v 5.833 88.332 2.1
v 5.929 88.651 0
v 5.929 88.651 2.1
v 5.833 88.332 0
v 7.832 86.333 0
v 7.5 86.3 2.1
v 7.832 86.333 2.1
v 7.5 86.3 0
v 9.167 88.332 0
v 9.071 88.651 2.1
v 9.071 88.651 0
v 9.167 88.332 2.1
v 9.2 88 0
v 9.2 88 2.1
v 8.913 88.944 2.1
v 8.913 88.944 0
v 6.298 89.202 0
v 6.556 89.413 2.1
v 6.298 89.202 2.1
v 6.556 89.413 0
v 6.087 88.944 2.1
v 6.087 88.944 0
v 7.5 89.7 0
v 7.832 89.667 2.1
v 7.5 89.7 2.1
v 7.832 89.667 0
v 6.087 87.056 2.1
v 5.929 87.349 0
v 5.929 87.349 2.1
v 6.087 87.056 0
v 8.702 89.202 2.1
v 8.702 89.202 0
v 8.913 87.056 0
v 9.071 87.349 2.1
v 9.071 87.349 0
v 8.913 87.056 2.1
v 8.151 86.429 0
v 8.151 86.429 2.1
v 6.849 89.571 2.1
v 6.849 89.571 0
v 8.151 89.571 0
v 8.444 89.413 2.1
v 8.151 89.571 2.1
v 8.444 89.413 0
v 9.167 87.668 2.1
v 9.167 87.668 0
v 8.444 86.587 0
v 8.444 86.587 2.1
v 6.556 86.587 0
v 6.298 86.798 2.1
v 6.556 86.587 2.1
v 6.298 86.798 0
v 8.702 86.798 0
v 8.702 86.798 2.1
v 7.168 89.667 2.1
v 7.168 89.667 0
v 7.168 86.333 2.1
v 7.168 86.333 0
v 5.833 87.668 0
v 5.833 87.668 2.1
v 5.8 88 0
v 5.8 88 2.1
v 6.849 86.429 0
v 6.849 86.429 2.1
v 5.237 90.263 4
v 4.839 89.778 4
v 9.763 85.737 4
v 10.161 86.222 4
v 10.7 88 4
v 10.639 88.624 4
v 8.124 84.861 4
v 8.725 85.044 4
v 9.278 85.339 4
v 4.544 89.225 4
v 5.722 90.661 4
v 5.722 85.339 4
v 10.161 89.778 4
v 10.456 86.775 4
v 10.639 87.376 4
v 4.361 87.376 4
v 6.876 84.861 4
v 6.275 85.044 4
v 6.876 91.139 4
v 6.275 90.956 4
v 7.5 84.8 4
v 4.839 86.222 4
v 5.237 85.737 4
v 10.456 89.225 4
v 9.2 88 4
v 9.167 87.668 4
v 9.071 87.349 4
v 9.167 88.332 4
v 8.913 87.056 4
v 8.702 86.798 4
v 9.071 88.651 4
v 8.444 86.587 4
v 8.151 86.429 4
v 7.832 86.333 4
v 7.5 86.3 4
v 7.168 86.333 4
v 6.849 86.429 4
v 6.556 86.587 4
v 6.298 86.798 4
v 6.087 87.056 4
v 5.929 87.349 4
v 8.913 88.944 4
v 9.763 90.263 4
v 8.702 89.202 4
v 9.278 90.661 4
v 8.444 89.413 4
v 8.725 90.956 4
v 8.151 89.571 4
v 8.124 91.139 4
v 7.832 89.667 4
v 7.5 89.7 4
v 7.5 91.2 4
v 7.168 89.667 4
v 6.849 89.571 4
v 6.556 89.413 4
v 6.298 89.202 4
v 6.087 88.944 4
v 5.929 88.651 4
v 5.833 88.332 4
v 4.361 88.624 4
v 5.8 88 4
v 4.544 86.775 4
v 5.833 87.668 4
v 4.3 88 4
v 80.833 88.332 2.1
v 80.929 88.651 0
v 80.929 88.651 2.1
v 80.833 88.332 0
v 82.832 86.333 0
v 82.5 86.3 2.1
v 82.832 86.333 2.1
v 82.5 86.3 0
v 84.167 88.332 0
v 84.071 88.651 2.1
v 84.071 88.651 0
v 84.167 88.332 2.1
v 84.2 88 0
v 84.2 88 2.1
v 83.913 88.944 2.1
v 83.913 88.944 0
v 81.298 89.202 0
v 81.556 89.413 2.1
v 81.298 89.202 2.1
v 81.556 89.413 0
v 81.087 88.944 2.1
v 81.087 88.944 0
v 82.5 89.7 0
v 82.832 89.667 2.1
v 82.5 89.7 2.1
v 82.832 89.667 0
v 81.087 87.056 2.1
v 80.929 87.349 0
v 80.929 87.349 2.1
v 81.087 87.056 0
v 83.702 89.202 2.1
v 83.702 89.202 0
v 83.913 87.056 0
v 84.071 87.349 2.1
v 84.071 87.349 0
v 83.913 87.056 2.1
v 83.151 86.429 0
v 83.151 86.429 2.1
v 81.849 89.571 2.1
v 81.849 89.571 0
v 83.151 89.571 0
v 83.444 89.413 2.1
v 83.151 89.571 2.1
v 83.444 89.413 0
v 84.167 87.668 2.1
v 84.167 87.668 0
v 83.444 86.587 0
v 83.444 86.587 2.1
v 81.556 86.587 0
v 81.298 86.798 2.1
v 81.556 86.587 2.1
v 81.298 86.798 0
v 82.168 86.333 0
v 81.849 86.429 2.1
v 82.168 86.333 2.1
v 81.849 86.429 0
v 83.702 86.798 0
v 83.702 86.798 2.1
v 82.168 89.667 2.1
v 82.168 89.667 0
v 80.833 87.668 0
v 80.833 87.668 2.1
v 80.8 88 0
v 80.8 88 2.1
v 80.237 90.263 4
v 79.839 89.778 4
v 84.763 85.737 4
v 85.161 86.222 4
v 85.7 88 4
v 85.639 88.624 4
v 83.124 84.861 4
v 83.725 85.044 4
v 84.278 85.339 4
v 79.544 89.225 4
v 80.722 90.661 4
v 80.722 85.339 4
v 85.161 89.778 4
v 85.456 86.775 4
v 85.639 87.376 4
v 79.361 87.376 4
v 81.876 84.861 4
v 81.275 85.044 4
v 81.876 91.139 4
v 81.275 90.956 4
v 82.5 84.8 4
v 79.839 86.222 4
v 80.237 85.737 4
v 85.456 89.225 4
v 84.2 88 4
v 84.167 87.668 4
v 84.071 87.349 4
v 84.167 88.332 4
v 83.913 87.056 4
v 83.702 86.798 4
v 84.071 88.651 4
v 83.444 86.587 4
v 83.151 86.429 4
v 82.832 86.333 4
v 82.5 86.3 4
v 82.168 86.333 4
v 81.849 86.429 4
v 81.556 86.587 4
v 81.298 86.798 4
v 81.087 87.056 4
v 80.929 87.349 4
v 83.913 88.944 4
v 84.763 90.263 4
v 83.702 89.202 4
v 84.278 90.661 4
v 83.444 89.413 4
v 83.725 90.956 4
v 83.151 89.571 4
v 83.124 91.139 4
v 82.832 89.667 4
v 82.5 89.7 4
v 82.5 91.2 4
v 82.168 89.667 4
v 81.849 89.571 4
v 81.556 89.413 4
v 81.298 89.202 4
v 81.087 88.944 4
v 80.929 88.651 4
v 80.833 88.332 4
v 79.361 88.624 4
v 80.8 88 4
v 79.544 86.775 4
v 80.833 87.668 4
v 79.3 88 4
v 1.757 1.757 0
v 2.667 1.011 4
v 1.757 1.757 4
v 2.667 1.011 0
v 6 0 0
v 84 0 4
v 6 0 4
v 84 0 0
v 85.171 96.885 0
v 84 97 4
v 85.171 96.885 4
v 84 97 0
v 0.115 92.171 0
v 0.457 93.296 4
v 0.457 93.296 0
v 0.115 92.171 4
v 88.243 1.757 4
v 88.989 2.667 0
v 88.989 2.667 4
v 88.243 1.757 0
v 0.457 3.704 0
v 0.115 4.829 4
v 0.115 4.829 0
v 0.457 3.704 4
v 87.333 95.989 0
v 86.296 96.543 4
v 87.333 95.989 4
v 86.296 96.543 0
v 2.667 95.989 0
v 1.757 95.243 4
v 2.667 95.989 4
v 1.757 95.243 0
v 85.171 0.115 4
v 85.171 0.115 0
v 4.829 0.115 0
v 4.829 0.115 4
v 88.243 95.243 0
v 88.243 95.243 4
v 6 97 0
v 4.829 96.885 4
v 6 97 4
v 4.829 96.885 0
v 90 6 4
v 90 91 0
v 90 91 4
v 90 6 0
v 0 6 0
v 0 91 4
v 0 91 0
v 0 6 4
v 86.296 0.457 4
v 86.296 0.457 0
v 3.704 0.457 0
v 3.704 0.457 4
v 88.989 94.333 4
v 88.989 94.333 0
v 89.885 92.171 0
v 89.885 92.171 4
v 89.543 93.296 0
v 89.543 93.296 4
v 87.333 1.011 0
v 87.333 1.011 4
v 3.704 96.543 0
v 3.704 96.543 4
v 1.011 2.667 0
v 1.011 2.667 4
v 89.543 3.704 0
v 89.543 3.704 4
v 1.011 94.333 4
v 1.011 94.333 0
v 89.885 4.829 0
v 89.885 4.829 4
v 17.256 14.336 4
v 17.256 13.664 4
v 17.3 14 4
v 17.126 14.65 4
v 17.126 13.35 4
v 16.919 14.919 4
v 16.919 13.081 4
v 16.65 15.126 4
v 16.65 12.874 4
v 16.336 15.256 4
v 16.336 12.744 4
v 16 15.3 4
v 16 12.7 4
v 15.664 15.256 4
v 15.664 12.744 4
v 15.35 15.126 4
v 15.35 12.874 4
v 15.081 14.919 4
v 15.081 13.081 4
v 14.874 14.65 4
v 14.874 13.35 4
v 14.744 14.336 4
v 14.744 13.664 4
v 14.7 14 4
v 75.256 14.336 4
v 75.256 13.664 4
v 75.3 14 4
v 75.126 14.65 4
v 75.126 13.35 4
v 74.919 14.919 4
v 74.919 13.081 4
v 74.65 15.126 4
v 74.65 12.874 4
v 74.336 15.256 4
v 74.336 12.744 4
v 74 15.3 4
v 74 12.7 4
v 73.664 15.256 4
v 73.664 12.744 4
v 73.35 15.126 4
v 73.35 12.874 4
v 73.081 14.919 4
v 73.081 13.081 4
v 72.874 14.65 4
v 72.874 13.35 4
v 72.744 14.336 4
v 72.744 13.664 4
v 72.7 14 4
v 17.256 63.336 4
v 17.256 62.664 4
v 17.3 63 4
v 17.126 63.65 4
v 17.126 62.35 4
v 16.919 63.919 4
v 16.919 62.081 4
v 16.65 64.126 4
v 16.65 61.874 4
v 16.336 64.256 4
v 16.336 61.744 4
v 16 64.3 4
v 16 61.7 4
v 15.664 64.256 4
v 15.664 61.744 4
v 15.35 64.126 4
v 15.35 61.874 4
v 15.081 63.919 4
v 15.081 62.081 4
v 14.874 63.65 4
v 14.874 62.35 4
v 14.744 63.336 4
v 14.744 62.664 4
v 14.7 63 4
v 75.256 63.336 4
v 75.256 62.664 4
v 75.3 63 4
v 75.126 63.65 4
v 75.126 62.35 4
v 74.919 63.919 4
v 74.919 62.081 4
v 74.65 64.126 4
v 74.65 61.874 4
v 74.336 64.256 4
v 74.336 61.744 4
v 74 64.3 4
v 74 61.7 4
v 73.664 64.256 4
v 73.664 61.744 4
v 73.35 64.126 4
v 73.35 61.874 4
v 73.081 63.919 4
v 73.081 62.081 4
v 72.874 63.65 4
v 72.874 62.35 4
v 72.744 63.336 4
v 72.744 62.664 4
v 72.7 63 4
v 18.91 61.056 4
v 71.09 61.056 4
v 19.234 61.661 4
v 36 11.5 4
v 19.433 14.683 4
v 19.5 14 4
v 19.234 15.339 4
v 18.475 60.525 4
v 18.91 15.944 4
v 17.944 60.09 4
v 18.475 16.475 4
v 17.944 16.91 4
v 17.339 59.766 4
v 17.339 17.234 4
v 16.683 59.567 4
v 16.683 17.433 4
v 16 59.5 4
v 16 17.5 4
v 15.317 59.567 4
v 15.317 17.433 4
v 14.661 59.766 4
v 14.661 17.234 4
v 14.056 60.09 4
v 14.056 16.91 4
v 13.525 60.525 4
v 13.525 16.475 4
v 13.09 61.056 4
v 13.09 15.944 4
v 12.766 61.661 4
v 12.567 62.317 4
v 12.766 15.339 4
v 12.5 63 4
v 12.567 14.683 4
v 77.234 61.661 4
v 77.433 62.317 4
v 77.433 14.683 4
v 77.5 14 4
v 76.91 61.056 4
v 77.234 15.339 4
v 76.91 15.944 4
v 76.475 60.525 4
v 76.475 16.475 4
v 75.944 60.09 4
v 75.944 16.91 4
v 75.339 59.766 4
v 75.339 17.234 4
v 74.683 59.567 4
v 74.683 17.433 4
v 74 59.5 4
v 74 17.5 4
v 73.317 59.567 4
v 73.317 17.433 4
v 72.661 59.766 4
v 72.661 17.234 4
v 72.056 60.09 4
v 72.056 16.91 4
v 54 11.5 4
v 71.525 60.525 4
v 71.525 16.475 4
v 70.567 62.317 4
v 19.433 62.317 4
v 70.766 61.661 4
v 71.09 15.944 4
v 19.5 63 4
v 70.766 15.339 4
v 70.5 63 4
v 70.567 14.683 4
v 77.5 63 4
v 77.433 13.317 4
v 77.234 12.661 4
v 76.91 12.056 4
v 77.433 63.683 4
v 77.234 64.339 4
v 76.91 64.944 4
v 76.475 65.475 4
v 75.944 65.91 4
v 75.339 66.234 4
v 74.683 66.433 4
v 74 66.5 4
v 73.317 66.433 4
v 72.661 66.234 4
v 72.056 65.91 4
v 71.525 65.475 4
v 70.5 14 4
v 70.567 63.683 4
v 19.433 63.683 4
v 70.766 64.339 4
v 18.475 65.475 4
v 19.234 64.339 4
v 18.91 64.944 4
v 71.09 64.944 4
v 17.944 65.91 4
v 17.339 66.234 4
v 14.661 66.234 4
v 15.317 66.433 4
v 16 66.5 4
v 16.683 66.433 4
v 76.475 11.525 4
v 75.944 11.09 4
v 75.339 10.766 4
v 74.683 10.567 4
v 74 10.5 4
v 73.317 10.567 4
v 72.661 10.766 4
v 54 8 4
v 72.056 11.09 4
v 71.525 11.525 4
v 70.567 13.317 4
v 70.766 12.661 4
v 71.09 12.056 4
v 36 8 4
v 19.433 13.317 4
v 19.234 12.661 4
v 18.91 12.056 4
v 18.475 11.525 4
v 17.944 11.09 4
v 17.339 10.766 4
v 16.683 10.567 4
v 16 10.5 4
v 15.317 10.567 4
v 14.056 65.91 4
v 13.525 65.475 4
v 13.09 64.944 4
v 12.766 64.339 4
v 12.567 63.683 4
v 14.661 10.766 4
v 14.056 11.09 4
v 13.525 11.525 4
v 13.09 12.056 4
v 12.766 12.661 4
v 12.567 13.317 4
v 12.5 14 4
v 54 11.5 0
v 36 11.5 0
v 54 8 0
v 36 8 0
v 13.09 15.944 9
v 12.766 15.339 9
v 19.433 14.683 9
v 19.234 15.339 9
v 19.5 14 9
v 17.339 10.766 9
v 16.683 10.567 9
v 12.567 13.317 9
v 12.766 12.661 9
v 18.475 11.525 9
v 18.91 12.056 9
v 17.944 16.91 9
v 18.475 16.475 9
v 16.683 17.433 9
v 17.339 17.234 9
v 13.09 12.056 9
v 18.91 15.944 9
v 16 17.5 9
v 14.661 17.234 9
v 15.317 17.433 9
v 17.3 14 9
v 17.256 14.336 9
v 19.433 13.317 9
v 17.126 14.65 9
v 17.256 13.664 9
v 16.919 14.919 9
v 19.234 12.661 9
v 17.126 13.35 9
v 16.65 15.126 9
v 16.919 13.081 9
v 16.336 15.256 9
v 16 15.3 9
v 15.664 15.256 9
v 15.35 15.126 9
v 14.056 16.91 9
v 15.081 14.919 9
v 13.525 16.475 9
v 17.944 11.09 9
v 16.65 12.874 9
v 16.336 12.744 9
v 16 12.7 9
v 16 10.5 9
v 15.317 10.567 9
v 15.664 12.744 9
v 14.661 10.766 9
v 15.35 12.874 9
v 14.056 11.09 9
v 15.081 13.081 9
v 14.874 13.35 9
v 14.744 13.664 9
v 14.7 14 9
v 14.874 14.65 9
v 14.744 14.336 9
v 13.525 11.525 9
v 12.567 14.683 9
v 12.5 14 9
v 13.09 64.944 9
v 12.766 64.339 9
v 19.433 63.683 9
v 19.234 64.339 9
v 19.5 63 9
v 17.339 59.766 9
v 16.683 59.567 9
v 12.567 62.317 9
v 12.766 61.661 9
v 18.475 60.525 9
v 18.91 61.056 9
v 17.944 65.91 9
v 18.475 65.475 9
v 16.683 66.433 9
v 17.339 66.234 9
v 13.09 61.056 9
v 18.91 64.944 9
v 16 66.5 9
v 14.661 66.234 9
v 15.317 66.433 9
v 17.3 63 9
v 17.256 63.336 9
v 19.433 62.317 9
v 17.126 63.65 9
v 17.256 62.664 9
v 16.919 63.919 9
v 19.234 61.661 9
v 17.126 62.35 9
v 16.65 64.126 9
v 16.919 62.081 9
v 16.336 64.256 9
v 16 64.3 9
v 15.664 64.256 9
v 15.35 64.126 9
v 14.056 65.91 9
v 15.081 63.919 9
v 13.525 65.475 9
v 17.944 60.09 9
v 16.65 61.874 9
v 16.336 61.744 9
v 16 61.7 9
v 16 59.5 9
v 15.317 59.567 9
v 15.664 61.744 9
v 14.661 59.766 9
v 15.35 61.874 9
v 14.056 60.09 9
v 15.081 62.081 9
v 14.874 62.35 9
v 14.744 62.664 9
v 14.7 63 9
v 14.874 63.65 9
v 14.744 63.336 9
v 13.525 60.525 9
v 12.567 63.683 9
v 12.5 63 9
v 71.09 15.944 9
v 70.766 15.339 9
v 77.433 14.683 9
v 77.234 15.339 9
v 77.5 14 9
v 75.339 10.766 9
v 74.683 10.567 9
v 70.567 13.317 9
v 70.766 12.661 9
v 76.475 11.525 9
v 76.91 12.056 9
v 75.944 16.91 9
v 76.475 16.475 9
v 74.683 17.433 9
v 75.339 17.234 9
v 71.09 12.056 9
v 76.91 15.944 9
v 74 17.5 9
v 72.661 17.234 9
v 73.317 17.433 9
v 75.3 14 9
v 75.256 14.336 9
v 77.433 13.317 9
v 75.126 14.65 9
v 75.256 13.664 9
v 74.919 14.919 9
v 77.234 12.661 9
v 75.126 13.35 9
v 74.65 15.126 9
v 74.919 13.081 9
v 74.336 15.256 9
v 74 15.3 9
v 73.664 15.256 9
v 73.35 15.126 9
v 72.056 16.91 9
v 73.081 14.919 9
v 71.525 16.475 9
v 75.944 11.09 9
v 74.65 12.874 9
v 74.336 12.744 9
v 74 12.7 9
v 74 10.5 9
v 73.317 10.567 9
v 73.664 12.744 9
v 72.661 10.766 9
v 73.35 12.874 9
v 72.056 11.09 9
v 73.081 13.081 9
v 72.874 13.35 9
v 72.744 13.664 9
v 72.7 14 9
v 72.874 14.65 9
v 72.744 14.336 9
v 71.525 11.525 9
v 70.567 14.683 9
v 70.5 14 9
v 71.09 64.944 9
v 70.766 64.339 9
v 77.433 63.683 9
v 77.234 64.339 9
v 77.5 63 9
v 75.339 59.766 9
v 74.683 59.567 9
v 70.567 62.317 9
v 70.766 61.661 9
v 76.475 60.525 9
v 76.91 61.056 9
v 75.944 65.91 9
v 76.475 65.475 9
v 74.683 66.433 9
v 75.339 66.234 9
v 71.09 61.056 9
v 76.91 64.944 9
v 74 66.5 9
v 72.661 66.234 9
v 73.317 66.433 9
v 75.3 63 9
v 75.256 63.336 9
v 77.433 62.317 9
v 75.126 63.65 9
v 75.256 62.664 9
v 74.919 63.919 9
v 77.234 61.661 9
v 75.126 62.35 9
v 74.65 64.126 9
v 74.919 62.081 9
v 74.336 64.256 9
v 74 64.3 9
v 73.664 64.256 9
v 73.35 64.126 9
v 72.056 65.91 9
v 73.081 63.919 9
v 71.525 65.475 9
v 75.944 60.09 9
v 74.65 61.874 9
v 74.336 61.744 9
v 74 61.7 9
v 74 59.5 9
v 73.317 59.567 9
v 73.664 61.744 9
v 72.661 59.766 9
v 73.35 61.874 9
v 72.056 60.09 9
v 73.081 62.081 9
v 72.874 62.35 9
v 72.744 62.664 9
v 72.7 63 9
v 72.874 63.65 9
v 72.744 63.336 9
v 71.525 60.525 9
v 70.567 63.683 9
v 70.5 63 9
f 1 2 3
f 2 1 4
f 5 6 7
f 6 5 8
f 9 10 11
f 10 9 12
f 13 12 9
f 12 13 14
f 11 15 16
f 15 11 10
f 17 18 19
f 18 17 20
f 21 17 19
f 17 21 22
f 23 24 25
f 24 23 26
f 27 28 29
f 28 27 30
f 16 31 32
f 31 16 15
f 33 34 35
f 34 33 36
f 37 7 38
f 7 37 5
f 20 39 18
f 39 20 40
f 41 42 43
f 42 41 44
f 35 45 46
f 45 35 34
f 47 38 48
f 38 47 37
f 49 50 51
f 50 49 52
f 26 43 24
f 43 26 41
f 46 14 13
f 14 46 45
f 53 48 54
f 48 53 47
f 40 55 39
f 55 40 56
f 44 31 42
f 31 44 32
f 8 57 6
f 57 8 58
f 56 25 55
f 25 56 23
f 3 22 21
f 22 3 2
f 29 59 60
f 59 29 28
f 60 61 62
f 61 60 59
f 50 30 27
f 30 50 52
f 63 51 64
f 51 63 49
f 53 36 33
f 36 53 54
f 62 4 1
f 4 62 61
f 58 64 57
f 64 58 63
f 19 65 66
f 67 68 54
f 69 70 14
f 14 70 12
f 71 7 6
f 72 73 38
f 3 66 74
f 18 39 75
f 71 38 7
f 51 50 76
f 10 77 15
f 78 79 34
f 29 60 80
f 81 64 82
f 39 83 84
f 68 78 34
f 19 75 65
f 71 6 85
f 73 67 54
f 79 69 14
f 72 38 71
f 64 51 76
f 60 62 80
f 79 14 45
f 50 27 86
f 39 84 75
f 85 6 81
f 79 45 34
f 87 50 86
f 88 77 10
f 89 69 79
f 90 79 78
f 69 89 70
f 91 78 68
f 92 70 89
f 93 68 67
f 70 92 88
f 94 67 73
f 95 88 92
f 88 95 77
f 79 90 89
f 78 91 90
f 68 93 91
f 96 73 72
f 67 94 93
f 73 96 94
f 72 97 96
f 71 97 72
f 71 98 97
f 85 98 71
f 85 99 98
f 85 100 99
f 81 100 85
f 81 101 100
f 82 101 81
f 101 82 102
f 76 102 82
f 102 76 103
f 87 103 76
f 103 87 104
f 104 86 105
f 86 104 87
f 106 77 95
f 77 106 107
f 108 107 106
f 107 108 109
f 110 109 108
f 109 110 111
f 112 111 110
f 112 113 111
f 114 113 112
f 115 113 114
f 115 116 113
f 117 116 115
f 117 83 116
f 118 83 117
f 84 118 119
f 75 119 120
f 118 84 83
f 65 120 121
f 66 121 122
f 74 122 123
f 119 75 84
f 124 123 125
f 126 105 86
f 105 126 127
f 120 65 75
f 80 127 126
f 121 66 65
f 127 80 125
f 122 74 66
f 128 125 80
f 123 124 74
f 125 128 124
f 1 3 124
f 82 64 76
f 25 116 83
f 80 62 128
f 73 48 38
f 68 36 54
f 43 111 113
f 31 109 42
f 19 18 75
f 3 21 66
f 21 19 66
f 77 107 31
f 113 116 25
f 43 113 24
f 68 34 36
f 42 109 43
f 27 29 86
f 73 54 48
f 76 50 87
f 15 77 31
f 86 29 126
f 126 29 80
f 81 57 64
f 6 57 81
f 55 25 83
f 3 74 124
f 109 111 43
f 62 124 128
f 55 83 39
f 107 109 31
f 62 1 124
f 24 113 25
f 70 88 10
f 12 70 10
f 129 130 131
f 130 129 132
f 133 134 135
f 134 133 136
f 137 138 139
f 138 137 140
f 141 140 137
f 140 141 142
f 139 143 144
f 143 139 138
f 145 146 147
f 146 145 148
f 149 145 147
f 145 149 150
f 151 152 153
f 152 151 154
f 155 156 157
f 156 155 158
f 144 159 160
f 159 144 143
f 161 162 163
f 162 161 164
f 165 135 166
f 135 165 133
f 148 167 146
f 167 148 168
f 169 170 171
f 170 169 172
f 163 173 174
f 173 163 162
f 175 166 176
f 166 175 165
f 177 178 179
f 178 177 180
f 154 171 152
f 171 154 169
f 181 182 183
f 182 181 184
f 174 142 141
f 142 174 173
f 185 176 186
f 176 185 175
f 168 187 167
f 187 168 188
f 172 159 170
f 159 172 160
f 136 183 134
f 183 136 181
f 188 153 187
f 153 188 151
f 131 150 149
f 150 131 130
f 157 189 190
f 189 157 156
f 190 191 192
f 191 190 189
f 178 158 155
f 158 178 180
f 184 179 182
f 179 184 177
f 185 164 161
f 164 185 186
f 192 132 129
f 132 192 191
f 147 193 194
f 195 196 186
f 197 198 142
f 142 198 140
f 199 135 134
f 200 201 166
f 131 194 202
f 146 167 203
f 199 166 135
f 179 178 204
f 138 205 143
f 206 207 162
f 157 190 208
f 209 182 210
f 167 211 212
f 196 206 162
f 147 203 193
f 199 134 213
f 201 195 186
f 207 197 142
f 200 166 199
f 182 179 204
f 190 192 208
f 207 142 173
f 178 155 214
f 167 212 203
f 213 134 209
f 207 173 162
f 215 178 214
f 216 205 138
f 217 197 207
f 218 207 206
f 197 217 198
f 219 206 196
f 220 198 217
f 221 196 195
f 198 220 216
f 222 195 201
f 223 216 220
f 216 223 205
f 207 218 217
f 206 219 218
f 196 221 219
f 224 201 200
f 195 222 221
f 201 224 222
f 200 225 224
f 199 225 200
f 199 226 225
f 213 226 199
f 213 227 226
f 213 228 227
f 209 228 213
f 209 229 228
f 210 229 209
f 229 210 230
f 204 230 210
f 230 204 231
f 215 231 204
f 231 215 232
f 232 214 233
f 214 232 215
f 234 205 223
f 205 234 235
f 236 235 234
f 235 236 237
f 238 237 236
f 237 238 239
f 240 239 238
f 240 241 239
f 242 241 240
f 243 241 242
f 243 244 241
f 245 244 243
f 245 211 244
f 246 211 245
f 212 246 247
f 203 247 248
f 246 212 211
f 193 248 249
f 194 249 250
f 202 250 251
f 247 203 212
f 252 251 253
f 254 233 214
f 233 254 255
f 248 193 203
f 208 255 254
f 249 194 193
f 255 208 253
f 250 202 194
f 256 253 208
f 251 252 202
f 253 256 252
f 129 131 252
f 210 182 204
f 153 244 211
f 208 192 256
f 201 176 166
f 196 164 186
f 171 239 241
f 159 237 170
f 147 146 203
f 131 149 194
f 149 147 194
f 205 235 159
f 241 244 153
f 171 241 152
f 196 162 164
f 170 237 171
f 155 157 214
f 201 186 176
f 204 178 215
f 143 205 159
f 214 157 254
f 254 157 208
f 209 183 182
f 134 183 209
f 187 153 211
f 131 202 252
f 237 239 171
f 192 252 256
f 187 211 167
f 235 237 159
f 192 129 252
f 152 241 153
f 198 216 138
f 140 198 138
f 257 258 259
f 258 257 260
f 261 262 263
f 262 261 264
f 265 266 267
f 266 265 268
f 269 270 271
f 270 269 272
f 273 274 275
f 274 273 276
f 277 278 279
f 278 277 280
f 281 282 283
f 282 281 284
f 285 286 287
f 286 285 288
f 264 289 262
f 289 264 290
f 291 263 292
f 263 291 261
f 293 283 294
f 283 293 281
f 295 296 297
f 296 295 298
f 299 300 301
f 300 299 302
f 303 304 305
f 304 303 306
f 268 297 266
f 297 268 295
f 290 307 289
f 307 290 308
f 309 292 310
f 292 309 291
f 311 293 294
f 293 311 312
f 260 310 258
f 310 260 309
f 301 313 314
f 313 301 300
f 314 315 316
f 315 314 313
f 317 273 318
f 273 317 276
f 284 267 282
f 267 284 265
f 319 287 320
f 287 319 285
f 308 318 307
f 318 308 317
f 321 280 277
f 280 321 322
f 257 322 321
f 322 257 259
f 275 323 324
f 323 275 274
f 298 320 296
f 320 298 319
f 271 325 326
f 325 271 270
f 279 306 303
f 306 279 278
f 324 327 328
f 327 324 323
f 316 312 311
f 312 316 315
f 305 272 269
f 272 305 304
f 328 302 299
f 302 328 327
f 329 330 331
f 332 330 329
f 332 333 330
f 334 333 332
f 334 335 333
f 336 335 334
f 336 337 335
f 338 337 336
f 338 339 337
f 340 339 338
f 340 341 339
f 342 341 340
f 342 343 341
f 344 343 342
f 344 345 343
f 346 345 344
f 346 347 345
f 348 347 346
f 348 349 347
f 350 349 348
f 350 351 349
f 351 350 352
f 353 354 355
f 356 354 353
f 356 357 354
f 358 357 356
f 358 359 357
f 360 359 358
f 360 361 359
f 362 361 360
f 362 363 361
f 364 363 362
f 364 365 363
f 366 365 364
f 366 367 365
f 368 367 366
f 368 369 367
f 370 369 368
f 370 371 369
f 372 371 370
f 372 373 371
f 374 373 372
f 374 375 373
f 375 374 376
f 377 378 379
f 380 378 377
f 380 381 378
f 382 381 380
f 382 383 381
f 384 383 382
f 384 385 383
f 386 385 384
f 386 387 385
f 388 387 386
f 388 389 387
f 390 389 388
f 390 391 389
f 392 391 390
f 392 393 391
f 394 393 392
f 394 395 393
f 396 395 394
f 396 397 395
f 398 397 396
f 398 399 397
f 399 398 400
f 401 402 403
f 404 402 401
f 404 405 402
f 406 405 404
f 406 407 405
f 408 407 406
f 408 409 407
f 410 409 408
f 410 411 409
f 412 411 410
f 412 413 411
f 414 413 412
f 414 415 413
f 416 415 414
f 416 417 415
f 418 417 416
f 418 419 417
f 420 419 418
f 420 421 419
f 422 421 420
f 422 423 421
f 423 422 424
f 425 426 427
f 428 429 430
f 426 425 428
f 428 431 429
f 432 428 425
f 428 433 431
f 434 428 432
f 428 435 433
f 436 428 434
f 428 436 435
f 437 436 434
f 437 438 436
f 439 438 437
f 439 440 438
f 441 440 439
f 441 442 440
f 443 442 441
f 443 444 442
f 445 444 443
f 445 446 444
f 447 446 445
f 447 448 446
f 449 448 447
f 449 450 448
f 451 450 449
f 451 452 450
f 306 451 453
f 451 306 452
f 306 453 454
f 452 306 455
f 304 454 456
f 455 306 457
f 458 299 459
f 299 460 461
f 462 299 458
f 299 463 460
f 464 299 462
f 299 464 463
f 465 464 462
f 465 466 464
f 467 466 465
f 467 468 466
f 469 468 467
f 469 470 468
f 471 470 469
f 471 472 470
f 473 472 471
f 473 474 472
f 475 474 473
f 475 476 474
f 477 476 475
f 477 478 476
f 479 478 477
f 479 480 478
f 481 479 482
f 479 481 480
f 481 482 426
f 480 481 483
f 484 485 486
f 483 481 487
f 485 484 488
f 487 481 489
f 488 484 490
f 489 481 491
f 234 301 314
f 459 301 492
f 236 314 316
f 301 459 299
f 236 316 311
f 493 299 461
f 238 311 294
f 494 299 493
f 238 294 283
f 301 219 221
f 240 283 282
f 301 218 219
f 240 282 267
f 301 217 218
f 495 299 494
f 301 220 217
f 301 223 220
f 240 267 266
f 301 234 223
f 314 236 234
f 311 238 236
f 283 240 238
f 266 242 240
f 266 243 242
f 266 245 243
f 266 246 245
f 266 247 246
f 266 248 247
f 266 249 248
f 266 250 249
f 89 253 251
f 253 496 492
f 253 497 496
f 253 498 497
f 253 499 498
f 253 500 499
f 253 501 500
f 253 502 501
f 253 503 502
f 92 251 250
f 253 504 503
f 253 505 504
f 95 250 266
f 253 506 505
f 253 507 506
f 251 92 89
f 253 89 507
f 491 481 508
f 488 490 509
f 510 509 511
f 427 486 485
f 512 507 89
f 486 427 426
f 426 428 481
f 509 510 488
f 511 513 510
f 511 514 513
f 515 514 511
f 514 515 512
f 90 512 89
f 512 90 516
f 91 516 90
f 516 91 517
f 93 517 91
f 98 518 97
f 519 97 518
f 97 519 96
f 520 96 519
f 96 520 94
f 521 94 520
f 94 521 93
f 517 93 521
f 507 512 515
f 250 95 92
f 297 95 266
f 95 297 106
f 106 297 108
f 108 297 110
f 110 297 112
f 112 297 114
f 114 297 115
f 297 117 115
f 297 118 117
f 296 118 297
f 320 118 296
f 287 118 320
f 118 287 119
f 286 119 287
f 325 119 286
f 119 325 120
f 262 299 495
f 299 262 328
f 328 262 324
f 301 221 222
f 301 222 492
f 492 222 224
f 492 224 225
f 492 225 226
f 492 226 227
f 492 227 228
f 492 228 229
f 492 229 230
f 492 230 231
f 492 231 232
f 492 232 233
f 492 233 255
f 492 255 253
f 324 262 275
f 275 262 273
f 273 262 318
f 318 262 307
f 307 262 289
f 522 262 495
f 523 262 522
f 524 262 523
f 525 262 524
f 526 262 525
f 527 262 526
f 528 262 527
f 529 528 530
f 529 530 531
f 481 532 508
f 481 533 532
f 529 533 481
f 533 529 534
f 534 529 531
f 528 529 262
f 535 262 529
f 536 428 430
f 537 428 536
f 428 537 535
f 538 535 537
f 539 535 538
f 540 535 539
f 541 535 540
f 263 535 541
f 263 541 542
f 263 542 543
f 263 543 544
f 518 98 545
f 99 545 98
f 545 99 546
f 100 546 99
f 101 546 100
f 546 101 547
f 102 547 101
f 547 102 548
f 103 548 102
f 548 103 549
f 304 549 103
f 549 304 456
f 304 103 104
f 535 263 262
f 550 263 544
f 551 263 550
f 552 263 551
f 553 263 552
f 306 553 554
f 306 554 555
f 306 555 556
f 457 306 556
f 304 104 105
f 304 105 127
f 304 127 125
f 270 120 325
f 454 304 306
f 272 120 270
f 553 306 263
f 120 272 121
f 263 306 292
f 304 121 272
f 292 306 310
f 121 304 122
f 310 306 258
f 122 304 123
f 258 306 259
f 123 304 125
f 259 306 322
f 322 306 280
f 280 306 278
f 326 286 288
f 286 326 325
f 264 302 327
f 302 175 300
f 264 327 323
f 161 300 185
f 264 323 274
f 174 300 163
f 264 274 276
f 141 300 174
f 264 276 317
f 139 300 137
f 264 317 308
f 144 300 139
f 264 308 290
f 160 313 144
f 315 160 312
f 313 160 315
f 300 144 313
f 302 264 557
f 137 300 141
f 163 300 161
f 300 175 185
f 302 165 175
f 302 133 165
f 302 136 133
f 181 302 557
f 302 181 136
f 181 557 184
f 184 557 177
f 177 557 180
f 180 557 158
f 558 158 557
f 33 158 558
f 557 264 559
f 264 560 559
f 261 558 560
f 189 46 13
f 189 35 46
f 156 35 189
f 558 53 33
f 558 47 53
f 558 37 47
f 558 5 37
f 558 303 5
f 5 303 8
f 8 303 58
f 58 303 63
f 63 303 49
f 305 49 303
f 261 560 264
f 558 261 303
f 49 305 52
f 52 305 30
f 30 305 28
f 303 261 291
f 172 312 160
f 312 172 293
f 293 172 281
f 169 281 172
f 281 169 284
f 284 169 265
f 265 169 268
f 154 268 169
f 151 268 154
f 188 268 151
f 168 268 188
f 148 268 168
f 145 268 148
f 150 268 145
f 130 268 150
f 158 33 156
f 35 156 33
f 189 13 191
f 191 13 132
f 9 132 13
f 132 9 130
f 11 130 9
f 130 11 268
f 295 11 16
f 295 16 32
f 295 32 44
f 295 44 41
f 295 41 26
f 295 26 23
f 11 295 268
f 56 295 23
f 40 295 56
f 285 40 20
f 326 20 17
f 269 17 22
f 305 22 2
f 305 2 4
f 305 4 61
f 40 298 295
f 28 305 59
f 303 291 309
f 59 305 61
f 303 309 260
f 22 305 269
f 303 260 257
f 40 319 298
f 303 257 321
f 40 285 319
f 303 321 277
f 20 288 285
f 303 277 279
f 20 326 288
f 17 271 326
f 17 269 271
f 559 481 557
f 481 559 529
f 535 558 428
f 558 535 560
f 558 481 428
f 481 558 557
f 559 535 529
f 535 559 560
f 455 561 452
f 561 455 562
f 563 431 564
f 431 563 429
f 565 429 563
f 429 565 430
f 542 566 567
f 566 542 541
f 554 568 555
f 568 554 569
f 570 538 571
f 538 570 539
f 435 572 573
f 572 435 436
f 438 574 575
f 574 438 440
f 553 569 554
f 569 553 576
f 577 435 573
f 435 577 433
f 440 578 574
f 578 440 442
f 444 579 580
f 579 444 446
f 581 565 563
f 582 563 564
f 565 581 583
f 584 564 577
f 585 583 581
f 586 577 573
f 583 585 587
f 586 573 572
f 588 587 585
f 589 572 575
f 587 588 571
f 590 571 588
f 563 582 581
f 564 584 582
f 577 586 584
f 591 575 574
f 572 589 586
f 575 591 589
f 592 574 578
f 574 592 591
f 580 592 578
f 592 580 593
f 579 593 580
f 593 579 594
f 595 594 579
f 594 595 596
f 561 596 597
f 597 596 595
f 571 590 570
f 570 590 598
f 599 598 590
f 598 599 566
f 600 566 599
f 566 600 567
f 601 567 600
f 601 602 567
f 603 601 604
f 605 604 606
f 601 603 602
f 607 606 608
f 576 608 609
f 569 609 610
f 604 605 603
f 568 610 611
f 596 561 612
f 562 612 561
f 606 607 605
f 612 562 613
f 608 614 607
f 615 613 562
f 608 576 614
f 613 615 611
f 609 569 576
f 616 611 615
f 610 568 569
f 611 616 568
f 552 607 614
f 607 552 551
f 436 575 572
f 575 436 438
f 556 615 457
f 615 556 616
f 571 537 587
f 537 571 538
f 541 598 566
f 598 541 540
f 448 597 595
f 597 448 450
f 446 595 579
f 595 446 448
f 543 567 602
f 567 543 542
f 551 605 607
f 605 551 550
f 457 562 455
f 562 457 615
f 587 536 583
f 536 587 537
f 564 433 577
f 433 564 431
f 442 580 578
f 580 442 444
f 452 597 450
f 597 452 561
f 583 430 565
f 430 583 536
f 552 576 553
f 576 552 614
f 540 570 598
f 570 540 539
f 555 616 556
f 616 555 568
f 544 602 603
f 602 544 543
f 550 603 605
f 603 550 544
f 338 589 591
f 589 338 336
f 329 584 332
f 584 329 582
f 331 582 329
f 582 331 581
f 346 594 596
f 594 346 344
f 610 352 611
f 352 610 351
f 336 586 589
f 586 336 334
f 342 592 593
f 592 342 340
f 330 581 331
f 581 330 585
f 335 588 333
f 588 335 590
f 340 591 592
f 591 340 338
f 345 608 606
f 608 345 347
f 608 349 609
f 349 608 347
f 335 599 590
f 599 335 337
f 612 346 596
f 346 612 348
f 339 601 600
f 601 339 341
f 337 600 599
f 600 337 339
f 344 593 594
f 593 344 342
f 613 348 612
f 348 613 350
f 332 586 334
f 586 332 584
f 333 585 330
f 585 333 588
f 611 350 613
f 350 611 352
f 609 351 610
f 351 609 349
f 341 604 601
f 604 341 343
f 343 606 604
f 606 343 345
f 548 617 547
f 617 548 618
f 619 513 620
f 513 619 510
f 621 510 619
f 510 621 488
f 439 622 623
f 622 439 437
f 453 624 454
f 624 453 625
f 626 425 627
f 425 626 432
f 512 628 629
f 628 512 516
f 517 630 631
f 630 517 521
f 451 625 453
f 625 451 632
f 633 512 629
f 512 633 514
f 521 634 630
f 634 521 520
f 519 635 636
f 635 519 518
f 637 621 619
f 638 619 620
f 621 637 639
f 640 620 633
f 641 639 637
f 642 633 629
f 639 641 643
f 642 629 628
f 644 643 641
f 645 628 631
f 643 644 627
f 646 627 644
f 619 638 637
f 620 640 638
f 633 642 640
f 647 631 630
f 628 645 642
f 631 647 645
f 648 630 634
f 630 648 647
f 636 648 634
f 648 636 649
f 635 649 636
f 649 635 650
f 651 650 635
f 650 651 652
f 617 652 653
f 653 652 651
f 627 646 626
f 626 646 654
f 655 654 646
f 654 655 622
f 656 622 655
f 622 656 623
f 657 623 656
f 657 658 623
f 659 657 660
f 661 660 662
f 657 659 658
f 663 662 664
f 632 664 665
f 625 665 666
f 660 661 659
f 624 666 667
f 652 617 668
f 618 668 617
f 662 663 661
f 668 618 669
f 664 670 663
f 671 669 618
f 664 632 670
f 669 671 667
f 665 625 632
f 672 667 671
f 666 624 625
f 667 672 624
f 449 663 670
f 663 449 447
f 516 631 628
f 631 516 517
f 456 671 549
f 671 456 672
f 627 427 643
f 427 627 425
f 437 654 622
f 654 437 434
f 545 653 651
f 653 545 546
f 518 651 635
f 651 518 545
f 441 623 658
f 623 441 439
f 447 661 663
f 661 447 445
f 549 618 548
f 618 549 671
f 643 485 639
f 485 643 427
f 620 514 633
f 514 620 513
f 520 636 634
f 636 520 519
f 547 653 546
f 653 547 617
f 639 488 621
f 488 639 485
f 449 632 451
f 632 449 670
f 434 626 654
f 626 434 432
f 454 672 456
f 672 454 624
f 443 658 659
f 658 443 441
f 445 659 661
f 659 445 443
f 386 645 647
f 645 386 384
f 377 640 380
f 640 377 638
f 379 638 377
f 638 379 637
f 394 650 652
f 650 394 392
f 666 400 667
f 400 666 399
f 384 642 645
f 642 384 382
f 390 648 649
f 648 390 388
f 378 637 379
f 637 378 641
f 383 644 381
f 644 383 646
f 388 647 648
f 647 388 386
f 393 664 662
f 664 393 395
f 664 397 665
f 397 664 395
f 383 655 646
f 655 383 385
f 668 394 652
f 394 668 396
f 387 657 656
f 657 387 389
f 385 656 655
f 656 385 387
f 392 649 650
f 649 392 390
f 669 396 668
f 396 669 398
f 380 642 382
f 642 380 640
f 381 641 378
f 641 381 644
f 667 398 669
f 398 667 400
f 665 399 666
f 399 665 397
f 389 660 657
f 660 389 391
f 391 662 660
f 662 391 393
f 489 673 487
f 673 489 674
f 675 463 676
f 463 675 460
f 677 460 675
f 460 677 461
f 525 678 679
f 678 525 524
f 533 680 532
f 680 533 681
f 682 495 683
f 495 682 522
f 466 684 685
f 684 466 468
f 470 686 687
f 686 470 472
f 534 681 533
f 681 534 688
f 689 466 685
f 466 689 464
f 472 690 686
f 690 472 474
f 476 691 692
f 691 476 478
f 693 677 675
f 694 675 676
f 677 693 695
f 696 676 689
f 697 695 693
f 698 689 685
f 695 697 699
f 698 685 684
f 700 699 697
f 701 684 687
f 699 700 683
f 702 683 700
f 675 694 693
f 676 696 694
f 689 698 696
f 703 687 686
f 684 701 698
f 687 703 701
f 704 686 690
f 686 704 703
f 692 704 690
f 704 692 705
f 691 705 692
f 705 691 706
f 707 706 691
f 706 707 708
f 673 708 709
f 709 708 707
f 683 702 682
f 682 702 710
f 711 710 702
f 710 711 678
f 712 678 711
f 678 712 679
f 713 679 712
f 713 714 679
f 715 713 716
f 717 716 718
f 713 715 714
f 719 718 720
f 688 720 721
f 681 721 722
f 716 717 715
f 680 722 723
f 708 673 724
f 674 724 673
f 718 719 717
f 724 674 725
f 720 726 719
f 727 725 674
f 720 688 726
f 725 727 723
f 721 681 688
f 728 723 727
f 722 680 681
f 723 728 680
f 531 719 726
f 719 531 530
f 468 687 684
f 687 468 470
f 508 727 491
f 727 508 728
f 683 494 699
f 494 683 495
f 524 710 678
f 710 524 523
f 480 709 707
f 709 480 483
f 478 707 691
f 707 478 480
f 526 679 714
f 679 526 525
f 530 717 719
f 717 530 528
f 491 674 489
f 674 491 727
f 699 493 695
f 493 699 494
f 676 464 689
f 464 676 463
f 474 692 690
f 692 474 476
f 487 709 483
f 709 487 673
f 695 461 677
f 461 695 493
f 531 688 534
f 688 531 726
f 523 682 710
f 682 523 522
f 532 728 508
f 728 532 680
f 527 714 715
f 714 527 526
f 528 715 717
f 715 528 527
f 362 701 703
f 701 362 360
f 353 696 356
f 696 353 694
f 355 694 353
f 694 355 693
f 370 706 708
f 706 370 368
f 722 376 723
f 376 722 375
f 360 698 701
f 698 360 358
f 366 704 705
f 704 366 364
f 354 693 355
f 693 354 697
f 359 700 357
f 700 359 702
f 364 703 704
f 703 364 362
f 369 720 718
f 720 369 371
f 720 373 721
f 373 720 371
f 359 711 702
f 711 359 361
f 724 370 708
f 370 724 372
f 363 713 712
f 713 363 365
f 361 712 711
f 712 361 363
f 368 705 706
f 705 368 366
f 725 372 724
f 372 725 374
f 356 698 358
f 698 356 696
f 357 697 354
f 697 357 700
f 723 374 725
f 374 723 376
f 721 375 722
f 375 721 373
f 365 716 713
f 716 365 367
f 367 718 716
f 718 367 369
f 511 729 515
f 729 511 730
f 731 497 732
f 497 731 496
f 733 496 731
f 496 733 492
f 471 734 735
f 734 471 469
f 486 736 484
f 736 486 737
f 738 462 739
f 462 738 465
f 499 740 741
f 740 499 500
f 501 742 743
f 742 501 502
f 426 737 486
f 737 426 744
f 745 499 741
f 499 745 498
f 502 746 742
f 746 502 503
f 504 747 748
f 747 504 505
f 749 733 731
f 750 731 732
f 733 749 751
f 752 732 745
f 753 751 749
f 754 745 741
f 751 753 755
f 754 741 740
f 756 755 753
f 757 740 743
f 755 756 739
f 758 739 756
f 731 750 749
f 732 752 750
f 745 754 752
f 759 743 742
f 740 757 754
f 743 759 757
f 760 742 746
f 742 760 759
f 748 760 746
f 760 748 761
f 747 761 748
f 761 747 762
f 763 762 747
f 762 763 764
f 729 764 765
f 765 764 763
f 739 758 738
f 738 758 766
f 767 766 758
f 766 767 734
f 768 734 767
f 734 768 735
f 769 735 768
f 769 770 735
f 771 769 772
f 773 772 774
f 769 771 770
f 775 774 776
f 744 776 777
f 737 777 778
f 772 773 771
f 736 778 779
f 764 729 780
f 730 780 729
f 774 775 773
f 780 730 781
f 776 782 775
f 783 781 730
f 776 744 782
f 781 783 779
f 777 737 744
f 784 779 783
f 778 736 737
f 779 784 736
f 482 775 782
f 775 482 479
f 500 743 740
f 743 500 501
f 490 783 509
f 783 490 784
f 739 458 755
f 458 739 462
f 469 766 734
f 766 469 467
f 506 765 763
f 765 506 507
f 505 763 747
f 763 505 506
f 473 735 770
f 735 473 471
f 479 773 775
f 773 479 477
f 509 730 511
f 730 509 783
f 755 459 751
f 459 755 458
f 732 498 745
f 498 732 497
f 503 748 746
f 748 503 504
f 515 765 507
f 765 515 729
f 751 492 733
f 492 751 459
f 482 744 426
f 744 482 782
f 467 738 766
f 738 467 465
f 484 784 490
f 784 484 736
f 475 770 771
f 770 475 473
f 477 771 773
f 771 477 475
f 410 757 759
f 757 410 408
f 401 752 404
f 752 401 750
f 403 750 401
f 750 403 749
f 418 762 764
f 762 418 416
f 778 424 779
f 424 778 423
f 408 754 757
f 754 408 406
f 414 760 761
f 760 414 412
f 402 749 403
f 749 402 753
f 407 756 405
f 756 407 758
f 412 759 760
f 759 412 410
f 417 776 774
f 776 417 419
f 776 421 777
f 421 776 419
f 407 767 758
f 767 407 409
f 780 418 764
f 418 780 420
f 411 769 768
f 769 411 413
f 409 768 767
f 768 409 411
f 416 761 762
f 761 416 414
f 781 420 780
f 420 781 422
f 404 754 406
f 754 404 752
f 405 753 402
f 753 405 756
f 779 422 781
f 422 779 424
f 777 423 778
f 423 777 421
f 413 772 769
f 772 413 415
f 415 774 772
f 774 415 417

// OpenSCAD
// Halter fuer den Raspberry Pi 4 an der Rueckseite des Bildschirms.
//
// Ersetzt die ausgelaserte Holzplatte: Er wird mit zwei M3-Schrauben in die
// beiden Gewinde des Bildschirms geschraubt (Abstand 75 mm, Gewinde nur 5 mm
// tief - also kurze Schrauben nehmen, M3 x 8 reicht). Der Pi sitzt auf vier
// angeformten Abstandshaltern, damit die Loetstellen unter der Platine frei
// bleiben.
//
// Offen und deshalb oben einstellbar: wie weit der Pi unter den Gewinden
// sitzen soll (PI_ABSTAND) und wie dick die Platte wird. Alles in Millimetern.
//
// Rendern und als STL sichern:  openscad -o pi-holder.stl pi-holder.scad

// ---- Was du anpassen kannst -------------------------------------------------
PLATTE_B      = 90;    // Breite der Platte, wie bei deiner Holzversion
PLATTE_D      = 4;     // Dicke der Platte
SCHIRM_LOCH   = 75;    // Abstand der beiden Gewinde im Bildschirm
SCHIRM_RAND   = 9;     // von der Oberkante der Platte bis zur Lochmitte
                       // gemessen hast du 5 - mit Senkung (Ø 6,4) blieben
                       // dann 1,8 mm Rand stehen. 9 gibt der Schraube Halt;
                       // die Platte ragt dafuer 4 mm weiter nach oben.
PI_ABSTAND    = 25;    // von der Lochmitte bis zur ersten Pi-Bohrung
STAND_H       = 5;     // Hoehe der Abstandshalter unter dem Pi
SCHRAUBE_M3   = 3.4;   // Durchgangsloch fuer M3
SCHRAUBE_M25  = 2.6;   // Kernloch fuer M2,5 - selbstschneidend in den Kunststoff
KABEL_SCHLITZ = true;  // Schlitz fuer das Kameraflachband

// ---- Feste Masse des Pi 4 ---------------------------------------------------
PI_X = 58;             // Lochabstand quer
PI_Y = 49;             // Lochabstand laengs
PI_RAND = 3.5;         // von der Platinenkante bis zur Lochmitte

PLATTE_H = SCHIRM_RAND + PI_ABSTAND + PI_Y + 14;

module abstandshalter() {
    difference() {
        cylinder(h = STAND_H, d = 7, $fn = 32);
        translate([0, 0, -0.1])
            cylinder(h = STAND_H + 0.2, d = SCHRAUBE_M25, $fn = 24);
    }
}

module platte() {
    difference() {
        // Grundplatte mit gerundeten Ecken
        hull() for (x = [6, PLATTE_B - 6], y = [6, PLATTE_H - 6])
            translate([x, y, 0]) cylinder(h = PLATTE_D, d = 12, $fn = 32);

        // Die beiden Schrauben in den Bildschirm
        for (dx = [-SCHIRM_LOCH / 2, SCHIRM_LOCH / 2])
            translate([PLATTE_B / 2 + dx, PLATTE_H - SCHIRM_RAND, -0.1]) {
                cylinder(h = PLATTE_D + 0.2, d = SCHRAUBE_M3, $fn = 32);
                // Senkung, damit der Schraubenkopf nicht auftraegt
                translate([0, 0, PLATTE_D - 1.8])
                    cylinder(h = 1.9, d1 = SCHRAUBE_M3, d2 = 6.4, $fn = 32);
            }

        // Schlitz fuer das Kameraflachband
        if (KABEL_SCHLITZ)
            translate([PLATTE_B / 2 - 9, 8, -0.1])
                cube([18, 3.5, PLATTE_D + 0.2]);
    }
}

module halter() {
    platte();
    // Vier Abstandshalter im Lochbild des Pi, mittig und unter den Schrauben
    pi_y0 = PLATTE_H - SCHIRM_RAND - PI_ABSTAND - PI_Y;
    for (dx = [0, PI_X], dy = [0, PI_Y])
        translate([(PLATTE_B - PI_X) / 2 + dx, pi_y0 + dy, PLATTE_D])
            abstandshalter();
}

halter();

// Hinweis zum Drucken: flach auf die Platte legen, 3 Perimeter, 25 % Fuellung.
// PETG oder PLA. Stuetzen braucht das Teil nicht.
